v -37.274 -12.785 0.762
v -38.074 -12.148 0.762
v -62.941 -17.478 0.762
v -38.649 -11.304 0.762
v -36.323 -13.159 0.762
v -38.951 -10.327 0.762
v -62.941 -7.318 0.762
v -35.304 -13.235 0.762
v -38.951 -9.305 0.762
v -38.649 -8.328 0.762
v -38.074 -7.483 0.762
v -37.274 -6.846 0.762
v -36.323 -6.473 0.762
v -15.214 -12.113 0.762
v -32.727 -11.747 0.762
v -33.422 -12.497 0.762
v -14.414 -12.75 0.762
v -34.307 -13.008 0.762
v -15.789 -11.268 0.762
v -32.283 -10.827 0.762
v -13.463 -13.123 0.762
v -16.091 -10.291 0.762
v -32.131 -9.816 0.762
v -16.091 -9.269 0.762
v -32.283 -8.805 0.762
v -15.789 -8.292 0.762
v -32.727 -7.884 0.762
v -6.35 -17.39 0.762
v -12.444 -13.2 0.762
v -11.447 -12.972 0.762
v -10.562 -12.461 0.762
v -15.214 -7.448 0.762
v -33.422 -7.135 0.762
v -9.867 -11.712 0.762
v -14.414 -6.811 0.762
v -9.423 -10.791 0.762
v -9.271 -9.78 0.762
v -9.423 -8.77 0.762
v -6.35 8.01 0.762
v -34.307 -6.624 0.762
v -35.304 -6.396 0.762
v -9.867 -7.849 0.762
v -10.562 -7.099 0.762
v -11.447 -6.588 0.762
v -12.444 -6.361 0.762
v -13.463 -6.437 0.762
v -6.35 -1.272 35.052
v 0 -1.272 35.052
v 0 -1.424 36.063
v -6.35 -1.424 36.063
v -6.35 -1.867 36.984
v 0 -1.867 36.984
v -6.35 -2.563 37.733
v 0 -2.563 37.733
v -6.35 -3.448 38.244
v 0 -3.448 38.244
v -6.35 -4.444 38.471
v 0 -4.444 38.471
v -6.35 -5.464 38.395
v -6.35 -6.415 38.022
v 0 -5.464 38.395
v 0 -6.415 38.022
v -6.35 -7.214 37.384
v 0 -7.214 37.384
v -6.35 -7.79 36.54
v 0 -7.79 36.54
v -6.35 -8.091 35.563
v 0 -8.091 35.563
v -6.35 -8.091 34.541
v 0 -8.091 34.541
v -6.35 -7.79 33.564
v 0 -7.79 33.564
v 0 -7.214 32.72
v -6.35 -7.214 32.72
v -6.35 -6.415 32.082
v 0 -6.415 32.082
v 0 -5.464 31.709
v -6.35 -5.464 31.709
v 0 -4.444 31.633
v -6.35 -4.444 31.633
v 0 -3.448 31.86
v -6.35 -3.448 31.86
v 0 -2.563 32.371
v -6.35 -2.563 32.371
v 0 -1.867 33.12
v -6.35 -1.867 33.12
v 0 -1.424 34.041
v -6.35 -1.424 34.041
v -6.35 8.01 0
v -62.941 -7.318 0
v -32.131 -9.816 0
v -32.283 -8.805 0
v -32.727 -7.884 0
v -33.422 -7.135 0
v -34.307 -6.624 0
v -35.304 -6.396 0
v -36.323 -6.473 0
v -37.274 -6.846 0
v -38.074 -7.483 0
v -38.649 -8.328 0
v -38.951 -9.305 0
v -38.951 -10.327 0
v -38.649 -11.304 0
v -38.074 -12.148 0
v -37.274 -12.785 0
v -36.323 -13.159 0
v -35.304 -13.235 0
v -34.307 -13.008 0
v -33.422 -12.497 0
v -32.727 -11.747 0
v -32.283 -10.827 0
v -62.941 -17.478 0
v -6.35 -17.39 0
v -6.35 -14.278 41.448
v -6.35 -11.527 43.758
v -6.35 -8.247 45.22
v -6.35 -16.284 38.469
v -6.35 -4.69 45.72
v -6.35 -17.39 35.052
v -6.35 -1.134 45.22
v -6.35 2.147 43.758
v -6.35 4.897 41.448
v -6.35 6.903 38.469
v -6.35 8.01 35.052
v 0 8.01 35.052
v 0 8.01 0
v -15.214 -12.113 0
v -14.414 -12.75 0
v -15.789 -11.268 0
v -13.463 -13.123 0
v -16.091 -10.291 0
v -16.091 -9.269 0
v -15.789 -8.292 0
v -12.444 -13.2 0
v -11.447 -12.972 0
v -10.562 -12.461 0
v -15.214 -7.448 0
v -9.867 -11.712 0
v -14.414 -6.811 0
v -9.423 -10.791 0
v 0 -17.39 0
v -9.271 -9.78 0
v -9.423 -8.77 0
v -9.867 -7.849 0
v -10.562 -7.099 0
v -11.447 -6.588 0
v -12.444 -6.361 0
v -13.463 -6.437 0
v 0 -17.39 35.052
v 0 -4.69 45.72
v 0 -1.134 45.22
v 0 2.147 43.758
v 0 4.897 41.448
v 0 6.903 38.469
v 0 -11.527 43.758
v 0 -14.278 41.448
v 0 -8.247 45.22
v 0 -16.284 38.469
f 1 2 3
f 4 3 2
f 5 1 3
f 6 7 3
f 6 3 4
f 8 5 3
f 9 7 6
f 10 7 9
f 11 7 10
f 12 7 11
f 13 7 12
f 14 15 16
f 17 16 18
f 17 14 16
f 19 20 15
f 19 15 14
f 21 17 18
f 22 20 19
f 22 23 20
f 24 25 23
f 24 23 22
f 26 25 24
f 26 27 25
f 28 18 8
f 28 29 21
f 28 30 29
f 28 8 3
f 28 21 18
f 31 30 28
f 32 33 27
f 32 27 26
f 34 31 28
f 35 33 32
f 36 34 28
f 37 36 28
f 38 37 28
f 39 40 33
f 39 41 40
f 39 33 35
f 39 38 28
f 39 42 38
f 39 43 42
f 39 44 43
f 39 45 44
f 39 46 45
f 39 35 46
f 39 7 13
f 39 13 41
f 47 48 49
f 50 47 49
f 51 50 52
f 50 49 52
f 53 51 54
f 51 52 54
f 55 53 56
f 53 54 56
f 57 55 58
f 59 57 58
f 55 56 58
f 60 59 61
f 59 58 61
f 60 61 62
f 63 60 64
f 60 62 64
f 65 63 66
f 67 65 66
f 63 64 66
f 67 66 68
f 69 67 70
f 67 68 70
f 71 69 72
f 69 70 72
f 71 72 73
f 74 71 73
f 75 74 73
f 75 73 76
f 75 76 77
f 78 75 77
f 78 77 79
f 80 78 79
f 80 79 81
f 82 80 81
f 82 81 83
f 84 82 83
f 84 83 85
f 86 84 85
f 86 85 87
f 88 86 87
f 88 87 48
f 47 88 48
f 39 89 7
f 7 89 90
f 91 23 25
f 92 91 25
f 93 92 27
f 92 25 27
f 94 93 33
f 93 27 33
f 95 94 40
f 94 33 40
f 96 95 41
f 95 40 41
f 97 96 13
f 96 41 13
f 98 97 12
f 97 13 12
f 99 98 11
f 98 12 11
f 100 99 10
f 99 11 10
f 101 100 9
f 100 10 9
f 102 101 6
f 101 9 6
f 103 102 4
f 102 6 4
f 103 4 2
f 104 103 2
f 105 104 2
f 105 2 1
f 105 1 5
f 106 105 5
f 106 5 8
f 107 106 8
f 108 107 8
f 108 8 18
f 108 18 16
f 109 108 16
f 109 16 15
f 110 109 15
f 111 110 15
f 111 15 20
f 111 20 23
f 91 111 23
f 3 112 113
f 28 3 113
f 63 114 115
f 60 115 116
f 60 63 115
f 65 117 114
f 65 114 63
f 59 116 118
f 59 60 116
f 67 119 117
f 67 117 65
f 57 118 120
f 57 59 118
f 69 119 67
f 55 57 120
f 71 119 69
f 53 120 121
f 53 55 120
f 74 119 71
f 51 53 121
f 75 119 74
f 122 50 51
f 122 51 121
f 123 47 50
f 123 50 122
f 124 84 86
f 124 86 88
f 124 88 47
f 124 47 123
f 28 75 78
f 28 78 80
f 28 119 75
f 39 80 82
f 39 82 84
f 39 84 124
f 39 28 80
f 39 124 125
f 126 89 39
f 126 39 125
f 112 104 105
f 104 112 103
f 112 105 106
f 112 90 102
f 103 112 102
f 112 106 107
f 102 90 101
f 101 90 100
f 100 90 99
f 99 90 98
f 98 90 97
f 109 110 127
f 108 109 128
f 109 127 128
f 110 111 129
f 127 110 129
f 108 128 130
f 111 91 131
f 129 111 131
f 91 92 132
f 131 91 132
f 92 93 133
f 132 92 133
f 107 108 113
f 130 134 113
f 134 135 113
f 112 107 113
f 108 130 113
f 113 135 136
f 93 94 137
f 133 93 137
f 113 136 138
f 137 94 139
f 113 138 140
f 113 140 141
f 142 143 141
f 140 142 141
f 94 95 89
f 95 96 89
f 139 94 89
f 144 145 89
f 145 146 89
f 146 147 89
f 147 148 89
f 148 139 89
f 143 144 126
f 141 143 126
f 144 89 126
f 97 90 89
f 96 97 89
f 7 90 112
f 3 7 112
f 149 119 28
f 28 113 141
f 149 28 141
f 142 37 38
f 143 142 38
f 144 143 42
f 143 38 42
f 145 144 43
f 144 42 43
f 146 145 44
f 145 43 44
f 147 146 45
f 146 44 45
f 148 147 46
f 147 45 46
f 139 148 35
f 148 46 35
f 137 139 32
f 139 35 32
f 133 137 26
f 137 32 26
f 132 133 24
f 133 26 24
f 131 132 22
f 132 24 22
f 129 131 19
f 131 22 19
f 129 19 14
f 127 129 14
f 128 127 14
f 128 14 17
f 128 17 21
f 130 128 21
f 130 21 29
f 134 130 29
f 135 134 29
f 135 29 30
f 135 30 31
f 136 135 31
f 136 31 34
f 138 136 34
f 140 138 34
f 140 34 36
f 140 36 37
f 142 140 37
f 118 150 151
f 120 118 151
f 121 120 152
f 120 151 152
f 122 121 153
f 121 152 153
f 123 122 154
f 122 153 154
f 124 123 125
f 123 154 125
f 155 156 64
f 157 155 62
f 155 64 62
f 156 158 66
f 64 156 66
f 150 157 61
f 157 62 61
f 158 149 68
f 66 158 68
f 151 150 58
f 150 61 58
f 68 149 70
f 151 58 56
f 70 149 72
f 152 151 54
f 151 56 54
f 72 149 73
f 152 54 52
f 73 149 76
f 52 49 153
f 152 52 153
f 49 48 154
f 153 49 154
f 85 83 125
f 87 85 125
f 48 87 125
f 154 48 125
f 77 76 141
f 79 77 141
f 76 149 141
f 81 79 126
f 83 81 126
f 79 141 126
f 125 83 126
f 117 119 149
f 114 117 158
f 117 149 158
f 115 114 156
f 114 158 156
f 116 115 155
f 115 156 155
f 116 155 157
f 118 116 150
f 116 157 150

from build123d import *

# Parameters (mm, degrees)
F0_W     = 6.35
F0_H     = 25.4
F1_DEPTH = 45.72
F2_DEPTH = 0.762
F4_DEPTH = 25.4
F3_R     = 3.429
F5_DEPTH = 25.4
F6_R     = 3.429
F7_DEPTH = 25.4


with BuildPart() as f1:
    # F0 (on Top) → F1 (new body)
    with BuildSketch(Plane.XY):
        with Locations((-3.175, -4.690345)):
            Rectangle(F0_W, F0_H)
    extrude(amount=F1_DEPTH)

    # F0 (on Top) → F2 (join)
    with BuildSketch(Plane.XY):
        with Locations((-3.175, -4.690345)):
            Rectangle(F0_W, F0_H)
        Polygon((-62.9412, -17.478447), (-6.35, -17.390345), (-6.35, 8.009655), (-62.9412, -7.318447), align=None)
    extrude(amount=F2_DEPTH)

    # F3 (on face) → F4 (cut)
    with BuildSketch(Plane.YZ):
        with BuildLine():
            ThreePointArc((-4.690345, 45.72), (3.602667, 42.69911), (8.009655, 35.052))
            Line((8.009655, 35.052), (8.009655, 45.72))
            Line((8.009655, 45.72), (-4.690345, 45.72))
        make_face()
        with BuildLine():
            ThreePointArc((-17.390345, 35.052), (-12.983358, 42.69911), (-4.690345, 45.72))
            Line((-4.690345, 45.72), (-17.390345, 45.72))
            Line((-17.390345, 45.72), (-17.390345, 35.052))
        make_face()
    extrude(amount=-F4_DEPTH, mode=Mode.SUBTRACT)

    # F3 (on face) → F5 (cut)
    with BuildSketch(Plane.YZ):
        with Locations((-4.700625, 35.052)):
            Circle(F3_R)
    extrude(amount=-F5_DEPTH, mode=Mode.SUBTRACT)

    # F6 (on face) → F7 (cut)
    with BuildSketch(Plane.XY.offset(0.762)):
        with Locations((-35.56, -9.815811)):
            Circle(F6_R)
        with Locations((-12.7, -9.780222)):
            Circle(F6_R)
    extrude(amount=-F7_DEPTH, mode=Mode.SUBTRACT)


solid = f1.part
